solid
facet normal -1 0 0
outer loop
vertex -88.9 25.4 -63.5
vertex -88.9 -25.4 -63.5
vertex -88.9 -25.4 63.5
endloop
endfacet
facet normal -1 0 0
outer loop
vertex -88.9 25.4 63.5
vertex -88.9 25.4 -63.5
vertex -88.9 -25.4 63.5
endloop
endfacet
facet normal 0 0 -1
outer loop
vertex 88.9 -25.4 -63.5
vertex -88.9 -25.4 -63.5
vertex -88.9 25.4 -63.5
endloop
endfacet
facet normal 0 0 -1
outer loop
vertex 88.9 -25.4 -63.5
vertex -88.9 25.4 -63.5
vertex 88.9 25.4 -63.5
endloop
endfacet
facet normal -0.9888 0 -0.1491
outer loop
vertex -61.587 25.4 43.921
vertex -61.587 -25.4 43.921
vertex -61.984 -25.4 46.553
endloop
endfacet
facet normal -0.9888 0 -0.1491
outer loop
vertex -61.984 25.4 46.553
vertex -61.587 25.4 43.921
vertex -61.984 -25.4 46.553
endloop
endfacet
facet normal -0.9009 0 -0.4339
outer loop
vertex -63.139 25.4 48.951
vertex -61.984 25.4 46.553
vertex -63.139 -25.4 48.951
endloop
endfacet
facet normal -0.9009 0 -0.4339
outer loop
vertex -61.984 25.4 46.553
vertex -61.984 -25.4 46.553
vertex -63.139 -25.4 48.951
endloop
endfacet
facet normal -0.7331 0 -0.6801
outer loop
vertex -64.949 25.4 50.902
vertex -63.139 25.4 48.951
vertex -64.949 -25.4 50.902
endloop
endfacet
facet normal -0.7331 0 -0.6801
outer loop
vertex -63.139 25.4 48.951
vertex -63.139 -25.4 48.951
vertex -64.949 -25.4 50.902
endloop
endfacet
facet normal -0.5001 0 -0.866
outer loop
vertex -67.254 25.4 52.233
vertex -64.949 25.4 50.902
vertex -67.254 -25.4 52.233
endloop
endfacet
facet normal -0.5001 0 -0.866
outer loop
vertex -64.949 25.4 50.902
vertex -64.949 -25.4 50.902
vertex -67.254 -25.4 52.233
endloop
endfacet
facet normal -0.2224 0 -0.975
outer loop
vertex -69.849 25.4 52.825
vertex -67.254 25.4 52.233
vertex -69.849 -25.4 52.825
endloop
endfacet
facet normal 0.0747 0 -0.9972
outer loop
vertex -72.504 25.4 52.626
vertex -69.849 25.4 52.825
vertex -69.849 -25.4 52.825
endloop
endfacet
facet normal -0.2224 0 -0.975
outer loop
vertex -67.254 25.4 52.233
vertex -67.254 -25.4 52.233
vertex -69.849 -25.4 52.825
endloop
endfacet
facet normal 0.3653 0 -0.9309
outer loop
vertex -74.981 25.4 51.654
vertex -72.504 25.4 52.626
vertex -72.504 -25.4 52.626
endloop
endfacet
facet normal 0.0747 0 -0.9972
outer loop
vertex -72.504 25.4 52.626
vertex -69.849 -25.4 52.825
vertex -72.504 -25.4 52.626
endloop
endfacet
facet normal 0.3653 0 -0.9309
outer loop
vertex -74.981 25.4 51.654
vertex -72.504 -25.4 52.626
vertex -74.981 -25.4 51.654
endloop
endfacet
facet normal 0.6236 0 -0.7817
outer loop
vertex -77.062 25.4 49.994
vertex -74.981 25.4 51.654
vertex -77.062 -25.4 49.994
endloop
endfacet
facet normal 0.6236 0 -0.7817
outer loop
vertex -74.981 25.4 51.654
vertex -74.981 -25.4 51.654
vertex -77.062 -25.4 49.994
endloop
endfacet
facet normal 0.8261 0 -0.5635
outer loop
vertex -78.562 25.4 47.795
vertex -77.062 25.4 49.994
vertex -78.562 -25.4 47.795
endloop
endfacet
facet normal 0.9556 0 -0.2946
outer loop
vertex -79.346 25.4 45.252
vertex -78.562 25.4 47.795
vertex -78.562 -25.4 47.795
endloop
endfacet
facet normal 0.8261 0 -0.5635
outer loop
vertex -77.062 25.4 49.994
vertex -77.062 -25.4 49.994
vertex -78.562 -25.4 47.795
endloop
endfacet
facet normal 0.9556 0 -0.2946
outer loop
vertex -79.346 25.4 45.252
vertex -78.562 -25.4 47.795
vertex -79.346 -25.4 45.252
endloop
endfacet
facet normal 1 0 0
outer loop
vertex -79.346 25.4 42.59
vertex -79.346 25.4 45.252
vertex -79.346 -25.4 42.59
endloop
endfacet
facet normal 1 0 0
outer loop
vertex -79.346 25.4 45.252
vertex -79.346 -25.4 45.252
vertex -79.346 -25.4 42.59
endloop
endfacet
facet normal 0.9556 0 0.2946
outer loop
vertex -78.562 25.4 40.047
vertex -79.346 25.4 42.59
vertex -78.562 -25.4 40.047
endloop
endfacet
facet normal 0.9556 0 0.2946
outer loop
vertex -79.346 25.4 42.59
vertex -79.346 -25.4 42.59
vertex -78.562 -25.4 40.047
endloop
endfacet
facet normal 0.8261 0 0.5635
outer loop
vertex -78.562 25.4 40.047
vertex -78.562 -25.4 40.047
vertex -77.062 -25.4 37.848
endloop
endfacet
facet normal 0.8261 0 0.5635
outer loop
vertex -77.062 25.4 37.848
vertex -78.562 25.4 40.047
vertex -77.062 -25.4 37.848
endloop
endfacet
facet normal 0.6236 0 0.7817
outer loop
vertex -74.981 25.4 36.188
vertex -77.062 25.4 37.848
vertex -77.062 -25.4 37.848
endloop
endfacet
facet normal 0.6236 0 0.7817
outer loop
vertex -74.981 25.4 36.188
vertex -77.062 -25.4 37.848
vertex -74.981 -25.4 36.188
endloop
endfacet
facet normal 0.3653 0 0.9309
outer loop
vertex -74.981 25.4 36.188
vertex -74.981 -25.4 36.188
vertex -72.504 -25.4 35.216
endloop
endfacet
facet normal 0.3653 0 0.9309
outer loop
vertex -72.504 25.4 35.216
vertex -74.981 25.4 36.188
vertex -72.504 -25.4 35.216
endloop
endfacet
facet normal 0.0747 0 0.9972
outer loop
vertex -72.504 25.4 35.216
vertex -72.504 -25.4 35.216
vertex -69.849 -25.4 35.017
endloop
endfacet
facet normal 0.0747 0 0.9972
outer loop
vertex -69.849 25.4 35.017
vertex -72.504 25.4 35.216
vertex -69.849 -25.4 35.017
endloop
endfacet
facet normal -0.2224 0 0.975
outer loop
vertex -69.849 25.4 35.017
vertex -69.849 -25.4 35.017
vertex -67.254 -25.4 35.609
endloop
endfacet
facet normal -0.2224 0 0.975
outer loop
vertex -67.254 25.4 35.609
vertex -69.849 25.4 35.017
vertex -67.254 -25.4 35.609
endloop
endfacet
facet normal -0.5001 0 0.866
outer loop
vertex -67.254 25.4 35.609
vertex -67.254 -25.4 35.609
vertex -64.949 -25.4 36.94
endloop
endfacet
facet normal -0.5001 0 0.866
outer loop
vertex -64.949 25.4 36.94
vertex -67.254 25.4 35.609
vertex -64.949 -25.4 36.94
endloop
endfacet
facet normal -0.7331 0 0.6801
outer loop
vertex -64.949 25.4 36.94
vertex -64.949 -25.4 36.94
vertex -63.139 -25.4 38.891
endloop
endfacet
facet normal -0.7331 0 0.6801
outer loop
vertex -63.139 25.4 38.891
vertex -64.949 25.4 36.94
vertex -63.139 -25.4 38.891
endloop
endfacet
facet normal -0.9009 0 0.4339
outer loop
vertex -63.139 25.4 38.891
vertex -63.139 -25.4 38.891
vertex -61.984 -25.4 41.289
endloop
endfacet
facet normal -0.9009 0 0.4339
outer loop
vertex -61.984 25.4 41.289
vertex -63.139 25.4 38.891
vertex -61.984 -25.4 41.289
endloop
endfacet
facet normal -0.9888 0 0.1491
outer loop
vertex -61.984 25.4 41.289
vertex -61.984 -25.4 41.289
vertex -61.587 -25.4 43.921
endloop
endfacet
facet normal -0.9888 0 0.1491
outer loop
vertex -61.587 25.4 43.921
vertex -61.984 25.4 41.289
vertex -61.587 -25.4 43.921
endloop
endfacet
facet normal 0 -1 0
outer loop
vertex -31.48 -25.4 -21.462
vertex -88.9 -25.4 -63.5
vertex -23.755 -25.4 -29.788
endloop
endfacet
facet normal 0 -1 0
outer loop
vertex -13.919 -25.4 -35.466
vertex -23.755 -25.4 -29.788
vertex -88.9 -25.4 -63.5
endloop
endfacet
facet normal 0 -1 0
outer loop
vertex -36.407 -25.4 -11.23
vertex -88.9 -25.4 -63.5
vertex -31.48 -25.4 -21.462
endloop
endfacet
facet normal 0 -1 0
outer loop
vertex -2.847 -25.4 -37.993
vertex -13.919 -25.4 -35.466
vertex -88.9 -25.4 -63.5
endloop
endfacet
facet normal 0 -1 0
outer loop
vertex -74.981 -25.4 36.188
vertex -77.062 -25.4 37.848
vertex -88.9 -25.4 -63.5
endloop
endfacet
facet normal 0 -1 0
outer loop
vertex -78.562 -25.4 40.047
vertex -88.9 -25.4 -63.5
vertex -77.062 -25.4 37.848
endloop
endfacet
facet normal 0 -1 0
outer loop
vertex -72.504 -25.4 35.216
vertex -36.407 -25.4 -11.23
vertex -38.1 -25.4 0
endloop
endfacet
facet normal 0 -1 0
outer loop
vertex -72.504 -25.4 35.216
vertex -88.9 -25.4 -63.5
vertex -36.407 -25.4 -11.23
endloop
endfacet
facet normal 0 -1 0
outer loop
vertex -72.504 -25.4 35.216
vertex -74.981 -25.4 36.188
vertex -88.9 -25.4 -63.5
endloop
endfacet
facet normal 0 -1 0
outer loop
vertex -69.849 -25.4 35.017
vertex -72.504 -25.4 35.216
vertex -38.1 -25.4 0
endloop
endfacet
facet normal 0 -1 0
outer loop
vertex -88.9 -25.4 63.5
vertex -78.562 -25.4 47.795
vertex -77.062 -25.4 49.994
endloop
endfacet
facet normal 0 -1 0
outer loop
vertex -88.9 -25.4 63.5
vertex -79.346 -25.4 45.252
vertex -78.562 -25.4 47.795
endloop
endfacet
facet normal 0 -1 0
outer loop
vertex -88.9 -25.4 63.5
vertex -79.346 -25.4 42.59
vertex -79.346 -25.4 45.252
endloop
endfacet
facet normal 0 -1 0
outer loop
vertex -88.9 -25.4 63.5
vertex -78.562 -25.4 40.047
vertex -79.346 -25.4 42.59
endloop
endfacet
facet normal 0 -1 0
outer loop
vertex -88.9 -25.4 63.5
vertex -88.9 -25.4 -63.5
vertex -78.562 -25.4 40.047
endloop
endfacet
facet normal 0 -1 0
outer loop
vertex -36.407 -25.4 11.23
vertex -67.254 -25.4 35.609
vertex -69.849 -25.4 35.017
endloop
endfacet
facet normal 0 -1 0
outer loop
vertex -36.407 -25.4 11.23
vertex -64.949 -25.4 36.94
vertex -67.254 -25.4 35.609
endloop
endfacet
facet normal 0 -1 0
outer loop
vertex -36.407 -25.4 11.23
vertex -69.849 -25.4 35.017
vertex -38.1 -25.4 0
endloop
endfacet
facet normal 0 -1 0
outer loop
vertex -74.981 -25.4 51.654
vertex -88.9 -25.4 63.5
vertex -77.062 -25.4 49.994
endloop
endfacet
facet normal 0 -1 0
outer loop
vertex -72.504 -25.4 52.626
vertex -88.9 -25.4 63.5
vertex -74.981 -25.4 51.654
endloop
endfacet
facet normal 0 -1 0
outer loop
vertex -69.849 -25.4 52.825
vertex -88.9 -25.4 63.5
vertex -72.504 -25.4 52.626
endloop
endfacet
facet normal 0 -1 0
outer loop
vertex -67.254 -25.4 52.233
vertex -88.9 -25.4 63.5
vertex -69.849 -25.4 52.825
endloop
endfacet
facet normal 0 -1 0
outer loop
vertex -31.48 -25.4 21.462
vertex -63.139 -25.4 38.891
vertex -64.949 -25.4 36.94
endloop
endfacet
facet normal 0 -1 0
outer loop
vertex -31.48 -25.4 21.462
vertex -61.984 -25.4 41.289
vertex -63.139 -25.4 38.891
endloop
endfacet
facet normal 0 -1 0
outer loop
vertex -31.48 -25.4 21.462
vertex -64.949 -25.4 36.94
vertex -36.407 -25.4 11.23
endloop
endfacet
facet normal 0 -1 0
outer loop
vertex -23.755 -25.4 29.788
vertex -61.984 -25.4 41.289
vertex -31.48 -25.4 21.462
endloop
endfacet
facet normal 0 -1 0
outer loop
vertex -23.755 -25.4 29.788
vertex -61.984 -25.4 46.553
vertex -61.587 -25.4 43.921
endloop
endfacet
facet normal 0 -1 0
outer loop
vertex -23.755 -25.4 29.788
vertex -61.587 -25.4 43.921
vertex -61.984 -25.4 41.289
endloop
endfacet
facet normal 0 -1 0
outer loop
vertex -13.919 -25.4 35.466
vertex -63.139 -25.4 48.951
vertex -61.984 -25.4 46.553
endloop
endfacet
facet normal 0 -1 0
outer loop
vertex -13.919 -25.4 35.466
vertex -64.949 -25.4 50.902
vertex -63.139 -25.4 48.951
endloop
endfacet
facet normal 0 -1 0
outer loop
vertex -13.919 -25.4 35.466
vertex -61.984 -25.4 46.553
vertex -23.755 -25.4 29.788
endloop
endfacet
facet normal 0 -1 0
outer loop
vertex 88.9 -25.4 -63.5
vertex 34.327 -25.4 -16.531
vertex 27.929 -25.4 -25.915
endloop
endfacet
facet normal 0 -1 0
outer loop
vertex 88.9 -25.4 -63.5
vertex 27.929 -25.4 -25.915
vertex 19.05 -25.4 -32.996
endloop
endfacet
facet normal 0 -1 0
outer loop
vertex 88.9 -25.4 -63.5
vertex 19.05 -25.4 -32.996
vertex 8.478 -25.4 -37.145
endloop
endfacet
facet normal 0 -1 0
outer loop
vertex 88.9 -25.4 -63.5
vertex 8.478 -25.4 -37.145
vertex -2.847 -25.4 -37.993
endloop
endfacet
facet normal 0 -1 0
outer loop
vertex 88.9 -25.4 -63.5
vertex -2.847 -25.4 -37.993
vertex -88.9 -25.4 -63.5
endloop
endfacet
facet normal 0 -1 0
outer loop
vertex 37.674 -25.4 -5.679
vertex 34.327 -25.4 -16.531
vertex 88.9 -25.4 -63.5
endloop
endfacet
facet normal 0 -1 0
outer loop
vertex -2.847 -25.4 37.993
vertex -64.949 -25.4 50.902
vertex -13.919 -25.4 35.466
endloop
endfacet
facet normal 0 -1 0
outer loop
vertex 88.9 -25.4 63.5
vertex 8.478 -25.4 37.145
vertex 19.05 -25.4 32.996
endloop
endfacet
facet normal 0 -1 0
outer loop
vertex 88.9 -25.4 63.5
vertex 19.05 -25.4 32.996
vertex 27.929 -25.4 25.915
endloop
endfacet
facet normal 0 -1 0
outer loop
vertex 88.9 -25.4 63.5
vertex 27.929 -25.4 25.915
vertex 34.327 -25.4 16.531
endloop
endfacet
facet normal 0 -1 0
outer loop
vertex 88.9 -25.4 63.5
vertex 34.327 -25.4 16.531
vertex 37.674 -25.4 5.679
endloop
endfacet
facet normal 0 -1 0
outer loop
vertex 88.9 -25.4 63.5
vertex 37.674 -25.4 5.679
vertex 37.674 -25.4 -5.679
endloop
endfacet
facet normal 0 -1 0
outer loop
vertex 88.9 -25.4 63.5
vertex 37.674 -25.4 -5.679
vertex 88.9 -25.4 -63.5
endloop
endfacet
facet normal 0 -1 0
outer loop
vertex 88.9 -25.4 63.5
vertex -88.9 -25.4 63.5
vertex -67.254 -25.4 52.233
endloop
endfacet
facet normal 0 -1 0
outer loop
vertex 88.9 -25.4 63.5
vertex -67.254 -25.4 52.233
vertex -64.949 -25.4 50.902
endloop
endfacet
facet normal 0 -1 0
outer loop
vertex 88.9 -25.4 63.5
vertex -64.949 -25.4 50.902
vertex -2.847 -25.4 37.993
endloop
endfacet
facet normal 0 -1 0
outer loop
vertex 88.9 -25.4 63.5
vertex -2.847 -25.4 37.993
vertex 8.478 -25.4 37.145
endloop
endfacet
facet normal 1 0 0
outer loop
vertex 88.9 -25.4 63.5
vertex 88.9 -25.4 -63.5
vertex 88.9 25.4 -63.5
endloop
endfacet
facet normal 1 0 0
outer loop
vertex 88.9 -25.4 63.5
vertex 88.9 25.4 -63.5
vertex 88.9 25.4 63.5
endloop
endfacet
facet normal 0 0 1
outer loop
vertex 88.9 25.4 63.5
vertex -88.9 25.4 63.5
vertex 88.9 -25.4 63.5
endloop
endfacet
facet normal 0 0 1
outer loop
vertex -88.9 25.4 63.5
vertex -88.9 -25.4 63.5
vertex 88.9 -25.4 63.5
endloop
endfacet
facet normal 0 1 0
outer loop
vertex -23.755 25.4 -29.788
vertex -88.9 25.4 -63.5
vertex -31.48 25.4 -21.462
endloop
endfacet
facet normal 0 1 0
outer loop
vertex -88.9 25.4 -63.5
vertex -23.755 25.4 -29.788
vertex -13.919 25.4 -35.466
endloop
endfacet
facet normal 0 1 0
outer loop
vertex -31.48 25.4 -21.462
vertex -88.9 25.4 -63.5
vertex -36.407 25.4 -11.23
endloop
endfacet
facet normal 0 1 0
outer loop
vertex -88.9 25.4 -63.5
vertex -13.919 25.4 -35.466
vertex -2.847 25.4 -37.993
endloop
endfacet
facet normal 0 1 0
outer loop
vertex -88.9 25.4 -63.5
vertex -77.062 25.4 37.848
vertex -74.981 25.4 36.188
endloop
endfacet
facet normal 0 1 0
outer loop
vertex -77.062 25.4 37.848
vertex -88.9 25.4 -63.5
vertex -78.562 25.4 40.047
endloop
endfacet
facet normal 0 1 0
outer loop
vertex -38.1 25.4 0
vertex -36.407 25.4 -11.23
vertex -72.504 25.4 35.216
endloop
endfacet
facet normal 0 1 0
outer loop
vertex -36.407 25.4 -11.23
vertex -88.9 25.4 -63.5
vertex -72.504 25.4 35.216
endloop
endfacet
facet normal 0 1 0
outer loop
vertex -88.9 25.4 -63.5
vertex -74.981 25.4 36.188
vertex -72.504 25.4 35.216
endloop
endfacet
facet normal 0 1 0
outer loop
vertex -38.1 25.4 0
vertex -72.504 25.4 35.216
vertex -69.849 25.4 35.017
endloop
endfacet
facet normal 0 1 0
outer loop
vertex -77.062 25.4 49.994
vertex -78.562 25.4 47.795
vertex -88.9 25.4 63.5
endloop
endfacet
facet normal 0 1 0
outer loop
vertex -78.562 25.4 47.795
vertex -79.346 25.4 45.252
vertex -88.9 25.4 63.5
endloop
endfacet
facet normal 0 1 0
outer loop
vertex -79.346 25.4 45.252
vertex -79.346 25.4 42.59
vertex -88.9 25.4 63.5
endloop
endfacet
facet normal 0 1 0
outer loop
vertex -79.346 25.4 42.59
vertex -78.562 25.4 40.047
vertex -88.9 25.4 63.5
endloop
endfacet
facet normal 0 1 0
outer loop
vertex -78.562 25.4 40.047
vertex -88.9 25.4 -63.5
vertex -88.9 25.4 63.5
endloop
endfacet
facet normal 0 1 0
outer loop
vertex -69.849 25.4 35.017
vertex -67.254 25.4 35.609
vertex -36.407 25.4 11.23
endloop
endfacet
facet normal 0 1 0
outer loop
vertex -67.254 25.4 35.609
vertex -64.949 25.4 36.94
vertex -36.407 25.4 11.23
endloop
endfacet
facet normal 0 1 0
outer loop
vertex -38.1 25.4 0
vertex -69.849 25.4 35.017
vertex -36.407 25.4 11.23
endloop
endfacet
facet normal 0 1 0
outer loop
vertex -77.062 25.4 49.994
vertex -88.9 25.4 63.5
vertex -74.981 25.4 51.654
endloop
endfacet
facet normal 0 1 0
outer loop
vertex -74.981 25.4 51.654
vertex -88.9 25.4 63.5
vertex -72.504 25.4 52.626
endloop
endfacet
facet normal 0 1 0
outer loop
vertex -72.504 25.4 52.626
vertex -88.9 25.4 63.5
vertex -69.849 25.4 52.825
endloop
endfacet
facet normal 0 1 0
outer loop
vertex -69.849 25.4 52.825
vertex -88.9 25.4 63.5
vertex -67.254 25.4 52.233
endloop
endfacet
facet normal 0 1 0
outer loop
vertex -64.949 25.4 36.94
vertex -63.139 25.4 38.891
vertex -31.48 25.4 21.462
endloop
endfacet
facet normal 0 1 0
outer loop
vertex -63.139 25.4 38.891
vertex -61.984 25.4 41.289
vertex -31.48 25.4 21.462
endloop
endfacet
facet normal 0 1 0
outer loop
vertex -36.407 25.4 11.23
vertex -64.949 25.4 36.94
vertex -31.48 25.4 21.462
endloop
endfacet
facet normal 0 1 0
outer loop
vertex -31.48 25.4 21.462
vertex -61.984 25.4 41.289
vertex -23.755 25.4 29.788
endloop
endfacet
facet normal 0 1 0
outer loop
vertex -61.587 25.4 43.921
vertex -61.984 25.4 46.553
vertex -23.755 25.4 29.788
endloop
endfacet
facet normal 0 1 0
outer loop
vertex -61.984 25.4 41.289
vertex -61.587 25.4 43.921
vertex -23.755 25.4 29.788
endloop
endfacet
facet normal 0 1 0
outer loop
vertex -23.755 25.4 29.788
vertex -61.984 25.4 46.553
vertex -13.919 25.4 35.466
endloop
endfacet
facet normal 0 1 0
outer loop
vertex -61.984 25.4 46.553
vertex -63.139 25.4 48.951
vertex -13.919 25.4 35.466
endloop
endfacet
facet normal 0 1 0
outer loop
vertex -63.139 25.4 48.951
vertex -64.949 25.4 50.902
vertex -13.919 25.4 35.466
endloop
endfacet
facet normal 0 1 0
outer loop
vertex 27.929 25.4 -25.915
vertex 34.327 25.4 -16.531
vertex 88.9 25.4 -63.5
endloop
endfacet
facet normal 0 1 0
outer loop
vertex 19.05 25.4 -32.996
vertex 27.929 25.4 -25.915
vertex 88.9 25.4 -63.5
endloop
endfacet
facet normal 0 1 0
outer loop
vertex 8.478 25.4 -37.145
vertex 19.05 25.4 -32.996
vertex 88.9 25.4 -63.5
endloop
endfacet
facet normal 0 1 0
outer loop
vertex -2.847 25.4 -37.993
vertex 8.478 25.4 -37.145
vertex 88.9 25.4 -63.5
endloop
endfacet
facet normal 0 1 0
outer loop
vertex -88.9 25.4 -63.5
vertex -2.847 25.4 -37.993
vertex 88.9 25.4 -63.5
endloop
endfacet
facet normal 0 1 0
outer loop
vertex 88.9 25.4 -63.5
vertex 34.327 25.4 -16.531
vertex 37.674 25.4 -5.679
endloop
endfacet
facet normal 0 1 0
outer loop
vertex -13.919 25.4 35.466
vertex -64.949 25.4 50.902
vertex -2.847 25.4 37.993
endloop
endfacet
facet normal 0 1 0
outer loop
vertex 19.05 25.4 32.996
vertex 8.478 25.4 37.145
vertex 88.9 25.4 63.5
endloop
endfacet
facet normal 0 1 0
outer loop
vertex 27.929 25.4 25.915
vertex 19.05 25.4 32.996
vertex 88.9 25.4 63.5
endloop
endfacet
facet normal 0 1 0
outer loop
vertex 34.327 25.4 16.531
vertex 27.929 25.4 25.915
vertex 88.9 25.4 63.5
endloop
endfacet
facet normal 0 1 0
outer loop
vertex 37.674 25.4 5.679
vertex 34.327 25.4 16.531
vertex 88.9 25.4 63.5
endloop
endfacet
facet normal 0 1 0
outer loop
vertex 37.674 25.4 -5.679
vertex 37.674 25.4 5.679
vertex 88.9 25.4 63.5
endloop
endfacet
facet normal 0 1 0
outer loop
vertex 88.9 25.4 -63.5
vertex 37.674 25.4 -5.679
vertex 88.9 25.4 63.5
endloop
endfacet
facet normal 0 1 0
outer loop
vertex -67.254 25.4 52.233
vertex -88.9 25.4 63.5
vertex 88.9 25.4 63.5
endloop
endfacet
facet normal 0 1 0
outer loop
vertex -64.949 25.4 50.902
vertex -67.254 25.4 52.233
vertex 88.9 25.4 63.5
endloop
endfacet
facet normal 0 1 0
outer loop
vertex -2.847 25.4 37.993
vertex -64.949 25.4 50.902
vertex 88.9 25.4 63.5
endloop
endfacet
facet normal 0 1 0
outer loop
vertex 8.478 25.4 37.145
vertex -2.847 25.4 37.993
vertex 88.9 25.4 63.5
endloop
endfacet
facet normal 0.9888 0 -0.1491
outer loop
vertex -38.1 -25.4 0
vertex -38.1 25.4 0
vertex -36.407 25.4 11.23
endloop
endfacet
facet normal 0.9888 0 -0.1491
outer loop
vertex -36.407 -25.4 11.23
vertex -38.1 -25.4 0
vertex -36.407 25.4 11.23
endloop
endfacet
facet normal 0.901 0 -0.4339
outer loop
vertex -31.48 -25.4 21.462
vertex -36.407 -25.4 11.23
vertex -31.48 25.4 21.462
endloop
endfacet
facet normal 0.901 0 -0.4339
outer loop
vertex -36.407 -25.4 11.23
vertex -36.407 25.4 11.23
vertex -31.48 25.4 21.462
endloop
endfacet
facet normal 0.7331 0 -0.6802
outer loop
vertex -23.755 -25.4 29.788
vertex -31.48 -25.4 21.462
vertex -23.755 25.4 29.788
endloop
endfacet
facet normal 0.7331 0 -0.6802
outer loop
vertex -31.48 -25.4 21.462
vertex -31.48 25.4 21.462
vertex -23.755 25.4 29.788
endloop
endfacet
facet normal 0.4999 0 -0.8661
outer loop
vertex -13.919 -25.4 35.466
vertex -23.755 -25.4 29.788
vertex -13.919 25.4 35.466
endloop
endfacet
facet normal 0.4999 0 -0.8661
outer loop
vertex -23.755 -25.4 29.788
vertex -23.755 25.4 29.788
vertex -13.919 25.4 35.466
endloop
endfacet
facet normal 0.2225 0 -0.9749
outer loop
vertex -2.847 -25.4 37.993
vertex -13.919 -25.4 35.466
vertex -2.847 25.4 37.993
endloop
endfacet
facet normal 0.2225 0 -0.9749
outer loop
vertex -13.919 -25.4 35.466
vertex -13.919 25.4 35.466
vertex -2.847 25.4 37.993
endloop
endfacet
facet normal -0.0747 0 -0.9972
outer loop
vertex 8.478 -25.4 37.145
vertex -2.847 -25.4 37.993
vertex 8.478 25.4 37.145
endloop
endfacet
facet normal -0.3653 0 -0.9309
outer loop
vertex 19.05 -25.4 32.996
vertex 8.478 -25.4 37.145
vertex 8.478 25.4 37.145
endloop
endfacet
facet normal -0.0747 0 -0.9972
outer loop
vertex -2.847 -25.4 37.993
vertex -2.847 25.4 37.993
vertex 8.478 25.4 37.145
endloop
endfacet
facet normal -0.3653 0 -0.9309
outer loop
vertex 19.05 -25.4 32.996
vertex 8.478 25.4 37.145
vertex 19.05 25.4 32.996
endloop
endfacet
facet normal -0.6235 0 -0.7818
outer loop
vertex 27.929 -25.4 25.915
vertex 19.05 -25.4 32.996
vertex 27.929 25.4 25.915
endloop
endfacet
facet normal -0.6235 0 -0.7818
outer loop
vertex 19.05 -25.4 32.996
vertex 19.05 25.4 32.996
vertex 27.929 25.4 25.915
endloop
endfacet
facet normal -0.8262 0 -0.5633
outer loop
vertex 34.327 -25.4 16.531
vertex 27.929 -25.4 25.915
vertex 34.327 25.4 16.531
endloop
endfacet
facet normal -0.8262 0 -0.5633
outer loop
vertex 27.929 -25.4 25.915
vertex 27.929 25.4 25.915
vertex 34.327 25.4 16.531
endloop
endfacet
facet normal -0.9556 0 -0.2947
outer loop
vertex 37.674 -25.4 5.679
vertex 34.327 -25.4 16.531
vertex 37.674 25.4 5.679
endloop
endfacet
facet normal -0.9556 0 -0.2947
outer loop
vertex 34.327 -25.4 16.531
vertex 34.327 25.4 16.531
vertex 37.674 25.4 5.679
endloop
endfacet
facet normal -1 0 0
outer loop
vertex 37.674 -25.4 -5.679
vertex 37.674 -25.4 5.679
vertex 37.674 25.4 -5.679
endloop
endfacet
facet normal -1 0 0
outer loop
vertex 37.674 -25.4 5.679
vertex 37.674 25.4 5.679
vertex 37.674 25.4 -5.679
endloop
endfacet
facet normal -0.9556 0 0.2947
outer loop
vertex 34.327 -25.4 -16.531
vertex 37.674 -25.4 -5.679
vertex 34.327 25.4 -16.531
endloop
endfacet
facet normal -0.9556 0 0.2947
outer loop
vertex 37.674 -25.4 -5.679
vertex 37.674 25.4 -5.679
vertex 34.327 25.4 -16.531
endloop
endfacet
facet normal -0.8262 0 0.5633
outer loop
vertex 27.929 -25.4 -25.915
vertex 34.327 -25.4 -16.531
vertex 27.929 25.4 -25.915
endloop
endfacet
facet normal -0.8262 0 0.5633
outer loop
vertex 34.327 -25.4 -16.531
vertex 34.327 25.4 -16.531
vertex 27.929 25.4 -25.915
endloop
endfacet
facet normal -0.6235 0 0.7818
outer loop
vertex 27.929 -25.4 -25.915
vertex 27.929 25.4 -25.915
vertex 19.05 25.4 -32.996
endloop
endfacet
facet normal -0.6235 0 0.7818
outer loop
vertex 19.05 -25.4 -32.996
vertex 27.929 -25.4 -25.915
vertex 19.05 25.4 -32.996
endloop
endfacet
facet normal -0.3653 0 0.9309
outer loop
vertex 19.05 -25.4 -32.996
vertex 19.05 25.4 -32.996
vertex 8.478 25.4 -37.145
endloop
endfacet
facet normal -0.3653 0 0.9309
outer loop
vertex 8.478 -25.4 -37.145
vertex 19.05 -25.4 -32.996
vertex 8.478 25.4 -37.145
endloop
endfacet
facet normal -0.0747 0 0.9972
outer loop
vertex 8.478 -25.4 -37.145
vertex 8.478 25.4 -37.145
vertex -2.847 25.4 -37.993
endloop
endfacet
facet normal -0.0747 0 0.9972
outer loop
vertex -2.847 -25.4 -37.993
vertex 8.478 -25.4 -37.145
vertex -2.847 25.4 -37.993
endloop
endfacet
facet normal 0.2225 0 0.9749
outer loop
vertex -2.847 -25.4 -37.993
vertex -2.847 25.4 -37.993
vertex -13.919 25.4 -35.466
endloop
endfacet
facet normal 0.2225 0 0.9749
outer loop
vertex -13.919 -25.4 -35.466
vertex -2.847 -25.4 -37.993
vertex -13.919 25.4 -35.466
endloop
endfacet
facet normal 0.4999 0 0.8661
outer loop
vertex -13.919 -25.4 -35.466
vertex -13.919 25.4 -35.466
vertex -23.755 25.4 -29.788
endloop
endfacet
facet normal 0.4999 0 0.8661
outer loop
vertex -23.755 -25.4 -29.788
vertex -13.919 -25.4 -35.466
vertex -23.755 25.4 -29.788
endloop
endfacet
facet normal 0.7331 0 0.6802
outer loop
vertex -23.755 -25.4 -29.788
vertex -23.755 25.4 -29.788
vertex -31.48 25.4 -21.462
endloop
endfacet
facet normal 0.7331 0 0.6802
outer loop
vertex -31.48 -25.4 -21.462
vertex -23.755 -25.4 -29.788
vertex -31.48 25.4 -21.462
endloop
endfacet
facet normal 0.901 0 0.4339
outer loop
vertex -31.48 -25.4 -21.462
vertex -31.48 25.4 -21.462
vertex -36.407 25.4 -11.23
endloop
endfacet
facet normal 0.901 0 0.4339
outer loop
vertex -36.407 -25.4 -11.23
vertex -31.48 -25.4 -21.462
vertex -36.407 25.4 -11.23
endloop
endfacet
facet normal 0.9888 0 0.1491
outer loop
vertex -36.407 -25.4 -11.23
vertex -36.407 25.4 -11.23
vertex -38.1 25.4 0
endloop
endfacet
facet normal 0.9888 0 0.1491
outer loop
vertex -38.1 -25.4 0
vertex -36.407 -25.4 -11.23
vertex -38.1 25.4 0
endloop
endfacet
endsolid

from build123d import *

# Parameters (mm, degrees)
F0_W     = 177.8
F0_H     = 127
F1_DEPTH = 25.4
F2_R     = 38.1
F3_DEPTH = 50.801
F4_R     = 8.929269
F5_DEPTH = 50.801


with BuildPart() as f1:
    # F0 (on Front) → F1 (new body, symmetric)
    with BuildSketch(Plane.XZ):
        Rectangle(F0_W, F0_H)
    extrude(amount=F1_DEPTH, both=True)

    # F2 (on face) → F3 (cut, through all)
    with BuildSketch(Plane(origin=(0, 25.4, 0), x_dir=(-1, 0, 0), z_dir=(0, 1, 0))):
        Circle(F2_R)
    extrude(amount=-F3_DEPTH, mode=Mode.SUBTRACT)

    # F4 (on face) → F5 (cut, through all)
    with BuildSketch(Plane.XZ.offset(25.4)):
        with Locations((-70.516594, 43.921053)):
            Circle(F4_R)
    extrude(amount=-F5_DEPTH, mode=Mode.SUBTRACT)


solid = f1.part
